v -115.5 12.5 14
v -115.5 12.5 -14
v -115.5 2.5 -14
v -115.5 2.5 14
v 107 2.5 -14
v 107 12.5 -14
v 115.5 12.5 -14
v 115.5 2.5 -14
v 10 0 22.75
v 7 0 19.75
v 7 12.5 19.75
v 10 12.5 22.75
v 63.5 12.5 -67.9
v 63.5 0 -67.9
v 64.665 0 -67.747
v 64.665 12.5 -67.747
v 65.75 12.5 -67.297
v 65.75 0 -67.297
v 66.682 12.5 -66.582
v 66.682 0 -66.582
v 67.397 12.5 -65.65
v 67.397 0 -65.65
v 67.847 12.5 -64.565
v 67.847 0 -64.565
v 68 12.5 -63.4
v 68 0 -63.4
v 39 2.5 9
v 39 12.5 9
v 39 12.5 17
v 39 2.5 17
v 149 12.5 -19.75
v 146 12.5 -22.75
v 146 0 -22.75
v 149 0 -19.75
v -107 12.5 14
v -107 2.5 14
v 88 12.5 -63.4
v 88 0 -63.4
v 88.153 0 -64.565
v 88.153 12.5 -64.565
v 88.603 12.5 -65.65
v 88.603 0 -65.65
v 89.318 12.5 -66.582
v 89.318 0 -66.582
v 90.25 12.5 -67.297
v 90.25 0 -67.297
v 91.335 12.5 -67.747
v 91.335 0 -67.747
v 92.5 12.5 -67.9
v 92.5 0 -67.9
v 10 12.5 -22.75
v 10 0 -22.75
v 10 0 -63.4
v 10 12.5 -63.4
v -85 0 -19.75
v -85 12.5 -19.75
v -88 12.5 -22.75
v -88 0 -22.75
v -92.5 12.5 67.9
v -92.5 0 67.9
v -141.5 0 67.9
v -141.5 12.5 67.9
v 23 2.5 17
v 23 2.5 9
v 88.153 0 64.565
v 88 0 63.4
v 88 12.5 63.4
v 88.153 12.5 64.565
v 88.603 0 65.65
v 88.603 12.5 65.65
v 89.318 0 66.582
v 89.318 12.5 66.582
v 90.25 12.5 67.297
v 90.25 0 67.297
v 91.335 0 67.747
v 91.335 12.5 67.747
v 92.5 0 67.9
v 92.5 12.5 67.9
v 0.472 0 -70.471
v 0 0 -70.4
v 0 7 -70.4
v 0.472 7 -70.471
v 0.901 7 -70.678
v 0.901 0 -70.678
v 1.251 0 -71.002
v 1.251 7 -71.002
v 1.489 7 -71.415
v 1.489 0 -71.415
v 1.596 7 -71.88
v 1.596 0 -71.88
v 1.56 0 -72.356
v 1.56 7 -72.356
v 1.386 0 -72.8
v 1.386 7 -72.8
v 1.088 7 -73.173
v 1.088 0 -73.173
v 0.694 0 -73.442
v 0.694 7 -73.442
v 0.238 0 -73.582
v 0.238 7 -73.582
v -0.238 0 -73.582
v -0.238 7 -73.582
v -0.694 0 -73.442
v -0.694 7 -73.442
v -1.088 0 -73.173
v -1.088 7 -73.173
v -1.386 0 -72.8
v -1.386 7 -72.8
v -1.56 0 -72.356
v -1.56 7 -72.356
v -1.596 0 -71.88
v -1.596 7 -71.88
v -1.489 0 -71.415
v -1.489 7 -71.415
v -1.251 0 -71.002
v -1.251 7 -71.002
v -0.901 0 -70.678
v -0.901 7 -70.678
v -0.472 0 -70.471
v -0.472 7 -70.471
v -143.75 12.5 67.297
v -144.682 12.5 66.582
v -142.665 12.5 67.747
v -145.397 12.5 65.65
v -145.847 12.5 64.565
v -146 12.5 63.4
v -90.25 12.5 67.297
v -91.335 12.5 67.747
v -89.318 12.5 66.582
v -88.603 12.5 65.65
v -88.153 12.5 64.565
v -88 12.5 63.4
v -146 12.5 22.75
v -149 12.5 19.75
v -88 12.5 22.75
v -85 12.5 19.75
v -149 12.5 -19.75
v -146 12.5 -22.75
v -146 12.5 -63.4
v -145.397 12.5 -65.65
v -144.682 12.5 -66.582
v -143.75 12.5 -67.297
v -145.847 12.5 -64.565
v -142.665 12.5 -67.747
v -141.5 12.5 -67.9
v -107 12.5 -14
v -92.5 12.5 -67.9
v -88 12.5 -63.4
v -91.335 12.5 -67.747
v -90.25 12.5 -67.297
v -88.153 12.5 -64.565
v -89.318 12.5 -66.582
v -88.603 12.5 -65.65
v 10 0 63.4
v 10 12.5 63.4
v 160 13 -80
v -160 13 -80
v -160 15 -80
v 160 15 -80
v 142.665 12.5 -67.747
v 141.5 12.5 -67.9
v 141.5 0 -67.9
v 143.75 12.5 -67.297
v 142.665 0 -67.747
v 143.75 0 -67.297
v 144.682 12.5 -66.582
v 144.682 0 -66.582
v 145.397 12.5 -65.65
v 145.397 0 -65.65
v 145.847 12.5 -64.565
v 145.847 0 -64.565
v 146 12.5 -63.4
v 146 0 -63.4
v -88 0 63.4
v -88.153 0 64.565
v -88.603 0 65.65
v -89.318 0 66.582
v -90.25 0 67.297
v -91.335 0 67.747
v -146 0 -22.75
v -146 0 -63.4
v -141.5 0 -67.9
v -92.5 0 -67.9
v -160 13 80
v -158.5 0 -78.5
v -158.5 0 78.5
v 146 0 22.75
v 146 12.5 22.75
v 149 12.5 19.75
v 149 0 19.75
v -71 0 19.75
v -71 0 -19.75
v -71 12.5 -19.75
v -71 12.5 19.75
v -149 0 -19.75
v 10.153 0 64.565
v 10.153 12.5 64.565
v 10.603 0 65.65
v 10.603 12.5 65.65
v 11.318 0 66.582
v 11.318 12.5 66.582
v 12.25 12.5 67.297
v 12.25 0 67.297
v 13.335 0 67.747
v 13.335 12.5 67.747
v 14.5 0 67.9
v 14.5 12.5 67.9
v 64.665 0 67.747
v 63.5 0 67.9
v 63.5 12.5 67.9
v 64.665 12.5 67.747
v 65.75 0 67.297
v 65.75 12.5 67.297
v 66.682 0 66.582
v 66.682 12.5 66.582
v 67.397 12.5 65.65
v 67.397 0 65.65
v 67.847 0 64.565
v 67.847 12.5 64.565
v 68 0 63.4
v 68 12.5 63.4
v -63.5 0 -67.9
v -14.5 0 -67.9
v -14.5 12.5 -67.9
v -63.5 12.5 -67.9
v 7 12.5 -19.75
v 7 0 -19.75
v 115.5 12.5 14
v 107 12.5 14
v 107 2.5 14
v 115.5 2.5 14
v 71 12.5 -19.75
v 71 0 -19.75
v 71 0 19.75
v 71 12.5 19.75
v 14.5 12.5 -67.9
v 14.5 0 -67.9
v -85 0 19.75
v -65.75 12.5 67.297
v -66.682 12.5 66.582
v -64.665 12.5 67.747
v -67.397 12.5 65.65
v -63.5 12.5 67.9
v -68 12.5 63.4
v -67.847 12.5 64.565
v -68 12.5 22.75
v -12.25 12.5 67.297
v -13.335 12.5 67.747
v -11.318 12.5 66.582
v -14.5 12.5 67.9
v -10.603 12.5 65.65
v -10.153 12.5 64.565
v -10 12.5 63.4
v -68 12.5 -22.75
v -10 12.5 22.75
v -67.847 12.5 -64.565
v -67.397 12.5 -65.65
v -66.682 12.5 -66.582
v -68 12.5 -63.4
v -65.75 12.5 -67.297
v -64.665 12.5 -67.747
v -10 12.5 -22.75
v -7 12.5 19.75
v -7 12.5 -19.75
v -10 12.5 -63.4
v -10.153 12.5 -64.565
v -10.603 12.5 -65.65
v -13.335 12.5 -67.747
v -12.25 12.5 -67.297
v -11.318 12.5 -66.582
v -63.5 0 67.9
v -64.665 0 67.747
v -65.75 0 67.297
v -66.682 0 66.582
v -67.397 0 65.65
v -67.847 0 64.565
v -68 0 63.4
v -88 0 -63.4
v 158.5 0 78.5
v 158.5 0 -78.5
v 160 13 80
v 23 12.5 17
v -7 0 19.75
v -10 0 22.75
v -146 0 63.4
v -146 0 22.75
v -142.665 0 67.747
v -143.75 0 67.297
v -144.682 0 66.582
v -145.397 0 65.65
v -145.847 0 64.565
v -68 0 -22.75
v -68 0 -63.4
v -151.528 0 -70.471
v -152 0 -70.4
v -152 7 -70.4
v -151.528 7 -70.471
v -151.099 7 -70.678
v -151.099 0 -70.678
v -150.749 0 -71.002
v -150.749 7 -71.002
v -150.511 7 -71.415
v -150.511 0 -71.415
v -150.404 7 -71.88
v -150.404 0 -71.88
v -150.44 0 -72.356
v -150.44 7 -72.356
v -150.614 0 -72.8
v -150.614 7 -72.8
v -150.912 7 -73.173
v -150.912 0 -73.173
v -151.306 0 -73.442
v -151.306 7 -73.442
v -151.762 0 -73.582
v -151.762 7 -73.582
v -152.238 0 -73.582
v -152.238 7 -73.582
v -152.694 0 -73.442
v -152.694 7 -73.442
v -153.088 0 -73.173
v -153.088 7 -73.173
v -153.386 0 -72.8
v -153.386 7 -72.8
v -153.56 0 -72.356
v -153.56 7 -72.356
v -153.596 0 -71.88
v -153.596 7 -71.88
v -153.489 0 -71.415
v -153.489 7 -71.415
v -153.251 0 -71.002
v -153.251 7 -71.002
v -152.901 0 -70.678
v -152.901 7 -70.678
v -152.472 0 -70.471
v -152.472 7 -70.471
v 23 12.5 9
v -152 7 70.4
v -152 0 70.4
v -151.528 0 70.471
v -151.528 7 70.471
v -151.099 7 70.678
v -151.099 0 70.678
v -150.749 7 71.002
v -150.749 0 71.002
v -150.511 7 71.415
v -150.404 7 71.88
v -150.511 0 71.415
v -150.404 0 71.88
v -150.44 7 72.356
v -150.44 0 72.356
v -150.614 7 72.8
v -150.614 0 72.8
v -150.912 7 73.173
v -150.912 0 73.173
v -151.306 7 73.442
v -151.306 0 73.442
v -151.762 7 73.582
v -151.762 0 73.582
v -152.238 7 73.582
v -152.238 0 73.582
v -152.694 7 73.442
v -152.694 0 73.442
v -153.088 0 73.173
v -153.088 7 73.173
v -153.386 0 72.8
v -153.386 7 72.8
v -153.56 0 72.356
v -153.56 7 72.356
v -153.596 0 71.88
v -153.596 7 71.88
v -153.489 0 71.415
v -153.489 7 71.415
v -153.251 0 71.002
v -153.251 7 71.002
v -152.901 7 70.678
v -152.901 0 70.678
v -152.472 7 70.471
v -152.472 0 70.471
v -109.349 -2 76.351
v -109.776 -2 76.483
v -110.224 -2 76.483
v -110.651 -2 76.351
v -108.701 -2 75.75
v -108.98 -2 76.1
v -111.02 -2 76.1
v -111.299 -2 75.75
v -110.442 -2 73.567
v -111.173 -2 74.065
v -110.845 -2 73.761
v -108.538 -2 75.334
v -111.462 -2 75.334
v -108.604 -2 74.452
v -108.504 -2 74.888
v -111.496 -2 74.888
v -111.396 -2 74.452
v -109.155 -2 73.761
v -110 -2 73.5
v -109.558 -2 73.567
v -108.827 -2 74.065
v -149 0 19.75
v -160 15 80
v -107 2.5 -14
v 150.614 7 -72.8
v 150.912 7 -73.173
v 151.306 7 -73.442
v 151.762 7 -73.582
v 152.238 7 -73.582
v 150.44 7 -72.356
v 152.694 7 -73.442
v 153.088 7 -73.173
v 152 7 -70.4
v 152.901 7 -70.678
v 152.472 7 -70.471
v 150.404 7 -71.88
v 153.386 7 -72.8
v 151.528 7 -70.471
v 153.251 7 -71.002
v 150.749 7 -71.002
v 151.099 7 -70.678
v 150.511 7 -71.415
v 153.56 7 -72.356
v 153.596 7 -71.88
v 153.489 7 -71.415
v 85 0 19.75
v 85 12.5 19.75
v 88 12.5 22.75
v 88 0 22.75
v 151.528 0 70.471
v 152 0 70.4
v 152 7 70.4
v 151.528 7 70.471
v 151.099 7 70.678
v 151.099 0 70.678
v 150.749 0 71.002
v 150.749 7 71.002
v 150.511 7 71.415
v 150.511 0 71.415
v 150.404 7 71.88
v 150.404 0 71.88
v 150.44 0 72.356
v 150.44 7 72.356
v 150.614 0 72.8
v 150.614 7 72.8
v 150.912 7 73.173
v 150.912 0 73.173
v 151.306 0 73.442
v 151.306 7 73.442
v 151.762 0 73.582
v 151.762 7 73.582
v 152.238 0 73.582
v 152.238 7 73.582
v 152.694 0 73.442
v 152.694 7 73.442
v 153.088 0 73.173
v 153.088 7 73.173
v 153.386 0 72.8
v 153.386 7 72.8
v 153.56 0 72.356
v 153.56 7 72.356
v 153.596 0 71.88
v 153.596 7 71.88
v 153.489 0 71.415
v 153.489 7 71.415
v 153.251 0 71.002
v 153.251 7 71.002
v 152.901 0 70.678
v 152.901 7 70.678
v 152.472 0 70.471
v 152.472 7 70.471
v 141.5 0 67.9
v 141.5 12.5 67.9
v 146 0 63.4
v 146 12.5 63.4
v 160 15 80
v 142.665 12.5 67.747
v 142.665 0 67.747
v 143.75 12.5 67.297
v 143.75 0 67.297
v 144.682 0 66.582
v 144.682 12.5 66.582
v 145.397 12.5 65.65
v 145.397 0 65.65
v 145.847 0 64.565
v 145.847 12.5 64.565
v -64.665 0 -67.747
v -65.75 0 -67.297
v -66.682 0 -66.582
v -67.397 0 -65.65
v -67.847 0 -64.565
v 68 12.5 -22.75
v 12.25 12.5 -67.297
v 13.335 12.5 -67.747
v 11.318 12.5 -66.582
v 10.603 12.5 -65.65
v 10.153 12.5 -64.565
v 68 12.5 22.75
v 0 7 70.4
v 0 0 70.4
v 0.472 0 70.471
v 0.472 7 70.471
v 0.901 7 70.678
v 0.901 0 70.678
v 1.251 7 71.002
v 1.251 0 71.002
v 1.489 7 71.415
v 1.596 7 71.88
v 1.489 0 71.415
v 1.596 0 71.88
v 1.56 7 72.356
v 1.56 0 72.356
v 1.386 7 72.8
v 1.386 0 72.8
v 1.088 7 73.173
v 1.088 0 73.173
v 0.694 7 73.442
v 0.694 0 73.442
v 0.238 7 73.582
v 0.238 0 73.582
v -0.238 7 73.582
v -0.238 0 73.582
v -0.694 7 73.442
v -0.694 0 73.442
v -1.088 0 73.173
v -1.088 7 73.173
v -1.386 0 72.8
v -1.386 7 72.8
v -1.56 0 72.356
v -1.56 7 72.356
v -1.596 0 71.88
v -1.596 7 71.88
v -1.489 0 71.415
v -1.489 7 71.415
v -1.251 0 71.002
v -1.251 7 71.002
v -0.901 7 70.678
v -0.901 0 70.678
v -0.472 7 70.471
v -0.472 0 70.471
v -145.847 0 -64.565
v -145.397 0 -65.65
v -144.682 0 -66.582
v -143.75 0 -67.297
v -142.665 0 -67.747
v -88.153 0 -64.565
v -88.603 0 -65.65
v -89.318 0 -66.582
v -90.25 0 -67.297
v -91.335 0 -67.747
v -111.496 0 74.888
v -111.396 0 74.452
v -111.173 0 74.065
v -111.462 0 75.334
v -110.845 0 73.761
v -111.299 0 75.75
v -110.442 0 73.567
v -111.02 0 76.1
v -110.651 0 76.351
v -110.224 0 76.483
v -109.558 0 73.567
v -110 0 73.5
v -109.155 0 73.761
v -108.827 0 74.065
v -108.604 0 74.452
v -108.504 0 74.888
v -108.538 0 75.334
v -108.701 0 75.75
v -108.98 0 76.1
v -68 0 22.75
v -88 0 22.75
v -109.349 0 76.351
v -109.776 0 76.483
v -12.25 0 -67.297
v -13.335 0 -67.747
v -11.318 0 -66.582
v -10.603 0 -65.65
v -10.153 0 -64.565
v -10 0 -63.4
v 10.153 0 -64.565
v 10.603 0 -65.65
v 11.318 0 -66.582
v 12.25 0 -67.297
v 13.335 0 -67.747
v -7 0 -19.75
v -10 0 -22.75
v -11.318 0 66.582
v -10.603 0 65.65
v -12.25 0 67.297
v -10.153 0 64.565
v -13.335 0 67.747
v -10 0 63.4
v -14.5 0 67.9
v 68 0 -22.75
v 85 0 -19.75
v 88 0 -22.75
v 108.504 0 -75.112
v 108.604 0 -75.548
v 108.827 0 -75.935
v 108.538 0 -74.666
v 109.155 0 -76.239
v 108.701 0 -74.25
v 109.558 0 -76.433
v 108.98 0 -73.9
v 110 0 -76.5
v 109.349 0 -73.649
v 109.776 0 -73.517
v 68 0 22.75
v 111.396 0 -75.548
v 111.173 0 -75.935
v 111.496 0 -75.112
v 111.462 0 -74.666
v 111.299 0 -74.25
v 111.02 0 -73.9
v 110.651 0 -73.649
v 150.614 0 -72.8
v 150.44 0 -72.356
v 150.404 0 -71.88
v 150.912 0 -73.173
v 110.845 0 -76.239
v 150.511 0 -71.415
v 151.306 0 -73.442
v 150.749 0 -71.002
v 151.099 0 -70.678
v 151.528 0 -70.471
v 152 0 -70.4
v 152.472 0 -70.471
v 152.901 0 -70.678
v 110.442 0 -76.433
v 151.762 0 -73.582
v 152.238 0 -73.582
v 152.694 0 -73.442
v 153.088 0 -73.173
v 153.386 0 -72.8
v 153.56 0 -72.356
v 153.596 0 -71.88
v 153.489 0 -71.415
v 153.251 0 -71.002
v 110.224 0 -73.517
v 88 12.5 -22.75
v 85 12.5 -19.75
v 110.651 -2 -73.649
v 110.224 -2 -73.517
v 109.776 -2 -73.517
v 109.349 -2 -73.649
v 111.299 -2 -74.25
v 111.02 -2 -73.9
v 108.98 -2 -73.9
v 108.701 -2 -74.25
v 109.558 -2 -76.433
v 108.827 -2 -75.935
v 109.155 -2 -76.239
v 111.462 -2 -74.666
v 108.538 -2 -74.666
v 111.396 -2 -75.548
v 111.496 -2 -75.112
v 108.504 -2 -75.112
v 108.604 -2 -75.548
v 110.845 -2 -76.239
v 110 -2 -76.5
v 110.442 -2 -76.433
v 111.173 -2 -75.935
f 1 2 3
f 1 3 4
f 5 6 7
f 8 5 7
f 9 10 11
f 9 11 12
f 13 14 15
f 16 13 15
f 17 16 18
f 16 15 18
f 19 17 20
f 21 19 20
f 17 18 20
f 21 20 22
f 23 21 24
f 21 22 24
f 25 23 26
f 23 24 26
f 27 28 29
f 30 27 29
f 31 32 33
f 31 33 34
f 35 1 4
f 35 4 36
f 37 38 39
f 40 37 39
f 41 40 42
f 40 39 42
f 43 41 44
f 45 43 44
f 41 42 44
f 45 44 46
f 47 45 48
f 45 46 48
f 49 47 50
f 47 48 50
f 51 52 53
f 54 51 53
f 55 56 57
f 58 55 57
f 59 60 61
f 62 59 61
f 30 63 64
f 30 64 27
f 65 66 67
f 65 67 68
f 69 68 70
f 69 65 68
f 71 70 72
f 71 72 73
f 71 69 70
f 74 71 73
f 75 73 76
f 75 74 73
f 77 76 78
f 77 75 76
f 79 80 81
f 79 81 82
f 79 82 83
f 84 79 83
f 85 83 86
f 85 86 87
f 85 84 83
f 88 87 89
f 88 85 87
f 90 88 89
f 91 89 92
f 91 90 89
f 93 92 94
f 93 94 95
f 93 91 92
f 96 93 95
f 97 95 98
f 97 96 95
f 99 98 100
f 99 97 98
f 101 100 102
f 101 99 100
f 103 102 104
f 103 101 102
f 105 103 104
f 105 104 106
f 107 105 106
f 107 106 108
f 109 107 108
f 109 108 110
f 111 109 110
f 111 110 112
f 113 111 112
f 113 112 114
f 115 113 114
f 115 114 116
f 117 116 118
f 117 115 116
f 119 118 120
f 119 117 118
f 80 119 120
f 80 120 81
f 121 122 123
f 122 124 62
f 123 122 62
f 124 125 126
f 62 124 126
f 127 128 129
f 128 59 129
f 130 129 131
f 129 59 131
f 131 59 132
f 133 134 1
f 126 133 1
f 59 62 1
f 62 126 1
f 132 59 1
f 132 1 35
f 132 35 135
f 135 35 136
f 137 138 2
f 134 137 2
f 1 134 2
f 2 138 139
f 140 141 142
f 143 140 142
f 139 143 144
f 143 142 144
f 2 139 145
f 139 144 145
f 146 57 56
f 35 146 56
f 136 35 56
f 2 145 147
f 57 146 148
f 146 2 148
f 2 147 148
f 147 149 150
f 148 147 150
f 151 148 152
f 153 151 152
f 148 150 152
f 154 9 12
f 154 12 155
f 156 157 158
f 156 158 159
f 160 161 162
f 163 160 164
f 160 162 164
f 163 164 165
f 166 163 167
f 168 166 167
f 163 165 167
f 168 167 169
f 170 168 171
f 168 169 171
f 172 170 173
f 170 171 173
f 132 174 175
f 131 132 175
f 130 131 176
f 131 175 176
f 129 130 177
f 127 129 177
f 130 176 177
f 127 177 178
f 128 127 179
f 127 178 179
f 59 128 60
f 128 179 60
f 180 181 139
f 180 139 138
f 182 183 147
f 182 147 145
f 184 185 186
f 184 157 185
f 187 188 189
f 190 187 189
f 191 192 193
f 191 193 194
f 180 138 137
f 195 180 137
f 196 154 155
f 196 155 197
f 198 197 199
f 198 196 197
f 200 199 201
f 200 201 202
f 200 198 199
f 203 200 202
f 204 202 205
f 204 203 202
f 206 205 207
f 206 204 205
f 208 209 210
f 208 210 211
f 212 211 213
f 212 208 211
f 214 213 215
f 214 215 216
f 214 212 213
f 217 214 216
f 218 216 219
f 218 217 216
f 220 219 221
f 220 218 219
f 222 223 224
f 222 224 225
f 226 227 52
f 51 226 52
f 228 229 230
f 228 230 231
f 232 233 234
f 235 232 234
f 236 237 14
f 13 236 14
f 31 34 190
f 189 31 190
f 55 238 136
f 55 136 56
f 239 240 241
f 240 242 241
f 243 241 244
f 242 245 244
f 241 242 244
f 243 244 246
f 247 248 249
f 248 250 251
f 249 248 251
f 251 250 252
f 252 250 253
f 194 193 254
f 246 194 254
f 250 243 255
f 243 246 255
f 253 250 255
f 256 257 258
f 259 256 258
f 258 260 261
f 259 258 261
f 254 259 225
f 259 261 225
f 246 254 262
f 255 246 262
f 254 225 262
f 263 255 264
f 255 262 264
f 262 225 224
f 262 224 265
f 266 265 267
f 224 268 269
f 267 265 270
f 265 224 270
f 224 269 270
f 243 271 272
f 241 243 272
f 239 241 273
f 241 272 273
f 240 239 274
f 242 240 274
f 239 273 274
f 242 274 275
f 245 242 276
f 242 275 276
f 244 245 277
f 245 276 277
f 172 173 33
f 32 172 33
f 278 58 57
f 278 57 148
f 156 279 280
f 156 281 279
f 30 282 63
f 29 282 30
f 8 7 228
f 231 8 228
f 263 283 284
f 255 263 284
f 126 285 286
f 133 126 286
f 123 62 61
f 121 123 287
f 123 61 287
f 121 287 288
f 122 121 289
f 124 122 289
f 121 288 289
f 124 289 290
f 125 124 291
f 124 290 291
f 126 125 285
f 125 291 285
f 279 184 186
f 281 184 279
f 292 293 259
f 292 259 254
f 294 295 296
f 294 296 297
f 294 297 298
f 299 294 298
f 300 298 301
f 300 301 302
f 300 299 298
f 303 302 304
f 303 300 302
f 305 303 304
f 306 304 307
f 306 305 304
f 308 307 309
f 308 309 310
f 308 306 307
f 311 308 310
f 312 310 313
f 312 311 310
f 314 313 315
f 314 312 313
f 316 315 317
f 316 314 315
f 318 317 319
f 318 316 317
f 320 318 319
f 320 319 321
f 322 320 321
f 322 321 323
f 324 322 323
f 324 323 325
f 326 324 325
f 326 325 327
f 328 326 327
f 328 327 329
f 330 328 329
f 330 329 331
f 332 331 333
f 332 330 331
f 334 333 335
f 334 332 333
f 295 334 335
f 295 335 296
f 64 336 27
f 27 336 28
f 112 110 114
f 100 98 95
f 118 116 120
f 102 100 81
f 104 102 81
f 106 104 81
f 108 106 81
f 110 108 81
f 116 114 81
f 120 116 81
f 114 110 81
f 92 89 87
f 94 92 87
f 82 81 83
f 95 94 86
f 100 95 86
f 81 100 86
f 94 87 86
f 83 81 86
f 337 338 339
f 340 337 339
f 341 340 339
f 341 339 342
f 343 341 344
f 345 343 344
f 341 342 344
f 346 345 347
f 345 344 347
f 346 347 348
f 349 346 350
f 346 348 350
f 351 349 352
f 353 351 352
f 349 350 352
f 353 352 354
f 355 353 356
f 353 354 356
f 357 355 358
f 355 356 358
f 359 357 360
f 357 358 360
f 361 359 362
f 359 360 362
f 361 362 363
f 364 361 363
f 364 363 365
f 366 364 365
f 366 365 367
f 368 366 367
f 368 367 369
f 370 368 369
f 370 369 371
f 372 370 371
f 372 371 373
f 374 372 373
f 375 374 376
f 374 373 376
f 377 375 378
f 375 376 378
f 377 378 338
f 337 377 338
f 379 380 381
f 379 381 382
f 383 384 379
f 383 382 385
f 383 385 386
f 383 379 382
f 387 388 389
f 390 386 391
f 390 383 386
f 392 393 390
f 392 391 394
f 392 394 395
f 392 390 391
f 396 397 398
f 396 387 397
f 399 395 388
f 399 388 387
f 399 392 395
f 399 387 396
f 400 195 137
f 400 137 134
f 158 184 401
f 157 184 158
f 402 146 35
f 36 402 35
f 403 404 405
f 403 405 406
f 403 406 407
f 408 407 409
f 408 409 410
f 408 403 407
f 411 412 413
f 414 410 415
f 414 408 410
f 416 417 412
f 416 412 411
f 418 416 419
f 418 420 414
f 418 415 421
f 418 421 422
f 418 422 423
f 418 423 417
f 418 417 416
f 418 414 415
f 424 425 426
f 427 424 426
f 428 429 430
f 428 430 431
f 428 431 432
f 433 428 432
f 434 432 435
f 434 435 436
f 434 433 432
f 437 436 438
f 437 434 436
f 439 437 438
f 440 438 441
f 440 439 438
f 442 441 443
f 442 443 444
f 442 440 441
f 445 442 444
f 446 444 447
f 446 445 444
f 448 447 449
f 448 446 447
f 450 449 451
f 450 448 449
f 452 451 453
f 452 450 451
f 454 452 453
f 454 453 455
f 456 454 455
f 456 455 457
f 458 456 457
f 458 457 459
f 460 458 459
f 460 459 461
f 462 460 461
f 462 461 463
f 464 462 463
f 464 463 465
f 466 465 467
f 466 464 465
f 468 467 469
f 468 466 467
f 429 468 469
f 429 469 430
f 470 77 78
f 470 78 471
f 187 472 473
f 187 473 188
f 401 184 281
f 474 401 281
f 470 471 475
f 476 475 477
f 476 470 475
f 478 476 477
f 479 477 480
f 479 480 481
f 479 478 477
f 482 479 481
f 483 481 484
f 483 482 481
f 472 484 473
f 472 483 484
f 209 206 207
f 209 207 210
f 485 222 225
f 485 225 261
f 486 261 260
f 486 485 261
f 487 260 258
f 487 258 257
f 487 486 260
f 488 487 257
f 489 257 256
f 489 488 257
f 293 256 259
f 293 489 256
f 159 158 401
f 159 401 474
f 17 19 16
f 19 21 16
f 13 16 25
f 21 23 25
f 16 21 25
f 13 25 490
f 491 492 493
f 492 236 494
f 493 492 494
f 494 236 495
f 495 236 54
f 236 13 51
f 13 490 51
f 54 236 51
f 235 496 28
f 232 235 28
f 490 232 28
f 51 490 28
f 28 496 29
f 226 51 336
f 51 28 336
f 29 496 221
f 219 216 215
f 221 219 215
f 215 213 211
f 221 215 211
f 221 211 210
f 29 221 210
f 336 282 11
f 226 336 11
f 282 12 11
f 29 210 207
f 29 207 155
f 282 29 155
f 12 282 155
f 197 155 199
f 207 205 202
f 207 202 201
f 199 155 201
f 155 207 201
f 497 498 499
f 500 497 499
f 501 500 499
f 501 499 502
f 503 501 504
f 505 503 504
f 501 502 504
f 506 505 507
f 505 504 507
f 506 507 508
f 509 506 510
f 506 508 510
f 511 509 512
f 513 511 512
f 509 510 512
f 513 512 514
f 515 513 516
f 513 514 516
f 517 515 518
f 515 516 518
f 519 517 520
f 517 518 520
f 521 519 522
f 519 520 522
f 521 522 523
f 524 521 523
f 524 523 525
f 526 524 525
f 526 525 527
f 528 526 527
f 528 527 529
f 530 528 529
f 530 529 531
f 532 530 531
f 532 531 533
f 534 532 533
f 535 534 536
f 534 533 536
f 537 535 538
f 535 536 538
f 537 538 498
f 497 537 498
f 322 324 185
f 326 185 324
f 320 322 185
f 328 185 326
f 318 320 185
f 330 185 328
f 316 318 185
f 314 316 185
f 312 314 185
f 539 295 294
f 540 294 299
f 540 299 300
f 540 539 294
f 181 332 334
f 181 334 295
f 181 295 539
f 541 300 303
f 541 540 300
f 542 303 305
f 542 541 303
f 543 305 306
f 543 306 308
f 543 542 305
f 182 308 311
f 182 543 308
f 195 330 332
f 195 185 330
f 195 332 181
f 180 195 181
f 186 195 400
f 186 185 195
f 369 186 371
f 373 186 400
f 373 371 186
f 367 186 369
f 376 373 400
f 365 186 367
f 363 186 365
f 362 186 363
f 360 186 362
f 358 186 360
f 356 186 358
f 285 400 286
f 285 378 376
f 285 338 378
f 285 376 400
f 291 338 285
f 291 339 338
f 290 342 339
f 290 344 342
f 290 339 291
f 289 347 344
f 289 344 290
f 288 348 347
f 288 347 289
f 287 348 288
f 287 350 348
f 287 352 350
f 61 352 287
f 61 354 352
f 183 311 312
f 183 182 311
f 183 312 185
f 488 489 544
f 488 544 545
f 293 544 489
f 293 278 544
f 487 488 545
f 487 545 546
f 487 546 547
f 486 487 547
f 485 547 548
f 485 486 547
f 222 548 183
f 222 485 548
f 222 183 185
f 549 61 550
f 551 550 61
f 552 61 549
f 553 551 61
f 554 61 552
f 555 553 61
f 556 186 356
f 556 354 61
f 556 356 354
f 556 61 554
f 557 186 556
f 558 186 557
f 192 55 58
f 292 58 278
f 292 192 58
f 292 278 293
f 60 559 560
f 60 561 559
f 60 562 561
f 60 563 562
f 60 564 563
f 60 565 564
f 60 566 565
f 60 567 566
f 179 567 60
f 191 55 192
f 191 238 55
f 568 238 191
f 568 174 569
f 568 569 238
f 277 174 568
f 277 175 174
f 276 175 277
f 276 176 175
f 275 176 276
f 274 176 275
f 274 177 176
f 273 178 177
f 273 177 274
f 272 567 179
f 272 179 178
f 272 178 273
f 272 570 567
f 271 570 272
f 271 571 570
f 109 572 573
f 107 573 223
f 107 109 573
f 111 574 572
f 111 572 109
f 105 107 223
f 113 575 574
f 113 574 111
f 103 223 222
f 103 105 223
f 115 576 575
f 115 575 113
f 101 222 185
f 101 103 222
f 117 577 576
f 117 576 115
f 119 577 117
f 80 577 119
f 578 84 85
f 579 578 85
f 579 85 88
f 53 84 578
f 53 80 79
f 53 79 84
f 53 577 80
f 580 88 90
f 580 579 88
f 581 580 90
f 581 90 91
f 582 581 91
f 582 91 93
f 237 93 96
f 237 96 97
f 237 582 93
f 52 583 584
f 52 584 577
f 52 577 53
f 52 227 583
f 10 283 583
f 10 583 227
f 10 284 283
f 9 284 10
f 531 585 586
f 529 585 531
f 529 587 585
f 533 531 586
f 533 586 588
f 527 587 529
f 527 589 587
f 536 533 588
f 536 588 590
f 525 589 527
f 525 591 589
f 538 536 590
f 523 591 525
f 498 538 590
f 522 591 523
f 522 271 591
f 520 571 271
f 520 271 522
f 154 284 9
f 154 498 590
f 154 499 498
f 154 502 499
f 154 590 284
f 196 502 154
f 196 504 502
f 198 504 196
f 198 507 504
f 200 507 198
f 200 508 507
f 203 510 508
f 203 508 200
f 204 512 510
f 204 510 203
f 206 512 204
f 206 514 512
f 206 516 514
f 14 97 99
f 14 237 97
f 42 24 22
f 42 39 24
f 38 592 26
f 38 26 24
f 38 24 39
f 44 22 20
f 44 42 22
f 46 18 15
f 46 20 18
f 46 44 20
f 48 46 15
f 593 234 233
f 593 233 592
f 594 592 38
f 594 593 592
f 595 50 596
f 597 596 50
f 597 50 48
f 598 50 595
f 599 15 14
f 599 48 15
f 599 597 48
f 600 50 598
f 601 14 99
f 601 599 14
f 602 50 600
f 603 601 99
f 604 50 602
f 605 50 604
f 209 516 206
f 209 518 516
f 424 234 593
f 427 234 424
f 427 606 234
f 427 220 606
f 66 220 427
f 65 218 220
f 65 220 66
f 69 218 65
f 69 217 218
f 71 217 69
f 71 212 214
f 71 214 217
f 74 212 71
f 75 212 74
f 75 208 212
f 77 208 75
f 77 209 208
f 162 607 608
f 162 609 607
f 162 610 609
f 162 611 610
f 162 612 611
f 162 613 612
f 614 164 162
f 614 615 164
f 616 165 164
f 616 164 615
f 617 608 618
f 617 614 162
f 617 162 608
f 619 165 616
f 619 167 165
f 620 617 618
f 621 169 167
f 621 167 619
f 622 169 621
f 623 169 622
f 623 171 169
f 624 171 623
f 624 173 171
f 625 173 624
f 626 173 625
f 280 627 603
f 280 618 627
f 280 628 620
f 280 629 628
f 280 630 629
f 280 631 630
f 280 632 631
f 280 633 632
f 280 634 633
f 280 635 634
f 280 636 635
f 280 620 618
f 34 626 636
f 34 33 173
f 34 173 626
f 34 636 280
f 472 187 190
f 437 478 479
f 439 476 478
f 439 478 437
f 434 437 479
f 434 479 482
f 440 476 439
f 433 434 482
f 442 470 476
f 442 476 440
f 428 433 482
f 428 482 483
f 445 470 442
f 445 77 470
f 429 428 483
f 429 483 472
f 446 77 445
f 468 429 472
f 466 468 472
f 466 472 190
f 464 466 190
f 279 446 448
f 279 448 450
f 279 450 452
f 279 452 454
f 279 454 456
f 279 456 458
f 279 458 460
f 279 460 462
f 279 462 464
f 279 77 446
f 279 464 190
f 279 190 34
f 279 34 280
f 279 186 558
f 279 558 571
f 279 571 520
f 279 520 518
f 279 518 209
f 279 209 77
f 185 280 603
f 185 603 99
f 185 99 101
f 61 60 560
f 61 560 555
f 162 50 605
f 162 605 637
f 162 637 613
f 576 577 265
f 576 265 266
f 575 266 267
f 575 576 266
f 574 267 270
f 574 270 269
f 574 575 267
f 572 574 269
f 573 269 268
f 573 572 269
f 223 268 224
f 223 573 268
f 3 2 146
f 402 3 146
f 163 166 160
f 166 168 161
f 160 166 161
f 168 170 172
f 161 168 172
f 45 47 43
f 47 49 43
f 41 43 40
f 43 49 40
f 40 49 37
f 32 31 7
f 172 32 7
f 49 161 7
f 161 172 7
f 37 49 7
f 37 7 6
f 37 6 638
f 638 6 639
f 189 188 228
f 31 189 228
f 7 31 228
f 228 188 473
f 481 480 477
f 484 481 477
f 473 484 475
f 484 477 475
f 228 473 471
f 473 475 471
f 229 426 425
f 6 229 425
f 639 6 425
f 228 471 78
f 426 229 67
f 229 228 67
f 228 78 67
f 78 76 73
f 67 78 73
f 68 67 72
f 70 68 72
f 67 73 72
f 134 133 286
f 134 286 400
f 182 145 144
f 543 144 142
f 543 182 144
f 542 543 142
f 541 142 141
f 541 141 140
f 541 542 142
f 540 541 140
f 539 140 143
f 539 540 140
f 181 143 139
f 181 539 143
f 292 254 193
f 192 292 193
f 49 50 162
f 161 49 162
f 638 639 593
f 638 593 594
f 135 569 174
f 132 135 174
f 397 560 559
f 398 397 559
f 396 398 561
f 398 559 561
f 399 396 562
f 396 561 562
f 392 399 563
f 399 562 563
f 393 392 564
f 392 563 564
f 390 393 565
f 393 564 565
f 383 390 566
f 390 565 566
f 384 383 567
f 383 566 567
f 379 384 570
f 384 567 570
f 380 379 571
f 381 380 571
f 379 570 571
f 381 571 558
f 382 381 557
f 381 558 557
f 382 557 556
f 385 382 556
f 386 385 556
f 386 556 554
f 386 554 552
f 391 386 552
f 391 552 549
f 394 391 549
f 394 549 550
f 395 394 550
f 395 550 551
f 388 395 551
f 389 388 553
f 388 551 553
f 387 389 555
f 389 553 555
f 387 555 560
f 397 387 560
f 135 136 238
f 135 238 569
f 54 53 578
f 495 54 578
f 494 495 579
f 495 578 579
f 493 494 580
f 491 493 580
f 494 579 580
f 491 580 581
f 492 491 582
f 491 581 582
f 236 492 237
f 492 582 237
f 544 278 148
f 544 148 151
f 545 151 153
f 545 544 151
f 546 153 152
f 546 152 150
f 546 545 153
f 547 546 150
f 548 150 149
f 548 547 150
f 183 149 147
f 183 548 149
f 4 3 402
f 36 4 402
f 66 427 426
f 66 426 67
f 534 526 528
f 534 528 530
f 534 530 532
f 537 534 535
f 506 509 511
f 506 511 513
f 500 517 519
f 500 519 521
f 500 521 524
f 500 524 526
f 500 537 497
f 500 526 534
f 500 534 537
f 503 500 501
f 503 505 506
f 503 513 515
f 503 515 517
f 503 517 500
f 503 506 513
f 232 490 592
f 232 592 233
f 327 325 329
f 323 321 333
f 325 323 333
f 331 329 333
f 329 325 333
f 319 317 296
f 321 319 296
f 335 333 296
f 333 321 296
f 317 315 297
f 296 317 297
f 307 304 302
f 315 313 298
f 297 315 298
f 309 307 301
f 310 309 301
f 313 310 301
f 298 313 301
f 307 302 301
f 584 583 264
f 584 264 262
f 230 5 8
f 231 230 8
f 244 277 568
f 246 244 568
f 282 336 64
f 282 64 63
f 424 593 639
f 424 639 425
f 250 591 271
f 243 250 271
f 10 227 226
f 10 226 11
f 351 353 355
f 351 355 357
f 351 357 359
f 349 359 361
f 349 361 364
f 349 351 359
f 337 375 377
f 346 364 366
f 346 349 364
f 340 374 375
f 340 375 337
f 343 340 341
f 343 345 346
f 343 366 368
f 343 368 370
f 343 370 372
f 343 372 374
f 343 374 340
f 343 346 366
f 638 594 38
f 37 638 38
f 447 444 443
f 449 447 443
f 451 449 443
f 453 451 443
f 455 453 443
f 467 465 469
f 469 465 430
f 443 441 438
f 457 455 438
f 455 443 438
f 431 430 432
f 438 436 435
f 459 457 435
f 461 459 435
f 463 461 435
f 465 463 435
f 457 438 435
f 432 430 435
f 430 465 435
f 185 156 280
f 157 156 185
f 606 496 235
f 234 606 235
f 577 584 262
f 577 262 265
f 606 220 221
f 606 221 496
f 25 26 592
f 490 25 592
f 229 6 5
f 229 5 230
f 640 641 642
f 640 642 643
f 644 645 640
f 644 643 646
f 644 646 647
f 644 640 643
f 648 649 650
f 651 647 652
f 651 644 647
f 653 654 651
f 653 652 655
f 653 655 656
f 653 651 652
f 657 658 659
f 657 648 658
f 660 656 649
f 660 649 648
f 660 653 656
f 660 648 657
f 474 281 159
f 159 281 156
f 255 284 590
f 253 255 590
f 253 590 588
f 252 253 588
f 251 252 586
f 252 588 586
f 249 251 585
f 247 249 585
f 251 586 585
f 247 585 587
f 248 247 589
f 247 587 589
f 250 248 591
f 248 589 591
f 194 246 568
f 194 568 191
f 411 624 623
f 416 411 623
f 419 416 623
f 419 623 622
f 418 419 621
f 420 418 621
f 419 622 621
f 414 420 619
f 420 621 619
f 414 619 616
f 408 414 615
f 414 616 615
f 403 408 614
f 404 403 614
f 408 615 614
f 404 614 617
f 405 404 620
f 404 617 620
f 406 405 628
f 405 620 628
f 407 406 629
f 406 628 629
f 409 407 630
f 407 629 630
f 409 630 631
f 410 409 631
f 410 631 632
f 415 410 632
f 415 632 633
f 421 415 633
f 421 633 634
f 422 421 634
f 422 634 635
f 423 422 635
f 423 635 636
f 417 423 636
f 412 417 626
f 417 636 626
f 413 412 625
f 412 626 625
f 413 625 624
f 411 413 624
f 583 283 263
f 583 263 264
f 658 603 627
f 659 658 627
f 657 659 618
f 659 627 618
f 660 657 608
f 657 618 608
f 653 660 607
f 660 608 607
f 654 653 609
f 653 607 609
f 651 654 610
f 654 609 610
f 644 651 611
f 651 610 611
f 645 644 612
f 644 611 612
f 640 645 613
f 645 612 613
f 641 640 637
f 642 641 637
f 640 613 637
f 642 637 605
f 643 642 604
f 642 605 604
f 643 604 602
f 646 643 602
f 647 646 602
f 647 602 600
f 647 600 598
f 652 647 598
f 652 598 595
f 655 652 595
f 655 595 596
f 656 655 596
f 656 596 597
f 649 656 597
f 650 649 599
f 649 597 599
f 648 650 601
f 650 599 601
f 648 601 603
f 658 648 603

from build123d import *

# Parameters (mm, degrees)
SKETCH2_W                                  = 320
SKETCH2_H                                  = 160
BOSS_EXTRUDE1_DEPTH                        = 2
SKETCH3_R                                  = 1.6
CUT_EXTRUDE1_DEPTH                         = 7
CUT_EXTRUDE2_DEPTH                         = 12.5
MIRROR1_AT_THE_SECOND_PLANE_COPY_1_SKETC_R = 1.6
MIRROR1_AT_THE_SECOND_PLANE_COPY_1_DEPTH   = 7
MIRROR1_AT_THE_SECOND_PLANE_COPY_2_DEPTH   = 12.5
SKETCH4_W                                  = 8.5
SKETCH4_H                                  = 28
SKETCH4_W_2                                = 16
SKETCH4_H_2                                = 8
BOSS_EXTRUDE3_DEPTH                        = 10
SKETCH5_R                                  = 1.5
BOSS_EXTRUDE4_DEPTH                        = 2


with BuildPart() as part:
    # Sketch2 → Boss-Extrude1 (new body)
    with BuildSketch(Plane(origin=(0, 13, 0), x_dir=(1, 0, 0), z_dir=(0, 1, 0))):
        Rectangle(SKETCH2_W, SKETCH2_H)
    extrude(amount=BOSS_EXTRUDE1_DEPTH)

    # Sketch1 → Loft1 section 0
    with BuildSketch(Plane(origin=(0, 0, 0), x_dir=(1, 0, 0), z_dir=(0, 1, 0))):
        with BuildLine():
            Line((-158.5, -78.5), (158.5, -78.5))
            Line((158.5, -78.5), (158.5, 78.5))
            Line((158.5, 78.5), (-158.5, 78.5))
            Line((-158.5, 78.5), (-158.5, -78.5))
        make_face()
    # Sketch2<2> → Loft1 section 1
    with BuildSketch(Plane(origin=(0, 13, 0), x_dir=(1, 0, 0), z_dir=(0, 1, 0))):
        with BuildLine():
            Line((160, -80), (-160, -80))
            Line((-160, -80), (-160, 80))
            Line((-160, 80), (160, 80))
            Line((160, 80), (160, -80))
        make_face()
    loft()

    # Sketch3 → Cut-Extrude1 (cut)
    with BuildSketch(Plane.XZ):
        with Locations((0, 72)):
            Circle(SKETCH3_R)
        with Locations((-152, 72)):
            Circle(SKETCH3_R)
    cut_extrude1 = extrude(amount=-CUT_EXTRUDE1_DEPTH, mode=Mode.SUBTRACT)

    # Sketch3<4> → Cut-Extrude2 (cut)
    with BuildSketch(Plane.XZ):
        with BuildLine():
            Line((-85, 0), (-85, 19.75))
            Line((-85, 19.75), (-88, 22.75))
            Line((-88, 22.75), (-88, 63.4))
            ThreePointArc((-88, 63.4), (-89.318019485, 66.581980515), (-92.5, 67.9))
            Line((-92.5, 67.9), (-141.5, 67.9))
            ThreePointArc((-141.5, 67.9), (-144.681980515, 66.581980515), (-146, 63.4))
            Line((-146, 63.4), (-146, 22.75))
            Line((-146, 22.75), (-149, 19.75))
            Line((-149, 19.75), (-149, 0))
            Line((-149, 0), (-85, 0))
        make_face()
        with BuildLine():
            Line((-71, 0), (-7, 0))
            Line((-7, 0), (-7, 19.75))
            Line((-7, 19.75), (-10, 22.75))
            Line((-10, 22.75), (-10, 63.4))
            ThreePointArc((-10, 63.4), (-11.318019485, 66.581980515), (-14.5, 67.9))
            Line((-14.5, 67.9), (-63.5, 67.9))
            ThreePointArc((-63.5, 67.9), (-66.681980515, 66.581980515), (-68, 63.4))
            Line((-68, 63.4), (-68, 22.75))
            Line((-68, 22.75), (-71, 19.75))
            Line((-71, 19.75), (-71, 0))
        make_face()
    cut_extrude2 = extrude(amount=-CUT_EXTRUDE2_DEPTH, mode=Mode.SUBTRACT)

    # Mirror1: Cut-Extrude1, Cut-Extrude2 across plane
    add(cut_extrude1.mirror(Plane.XY), mode=Mode.SUBTRACT)
    add(cut_extrude2.mirror(Plane.XY), mode=Mode.SUBTRACT)

    # Mirror1 at the second plane: Cut-Extrude1, Cut-Extrude2 across plane
    add(cut_extrude1.mirror(Plane(origin=(0, 0, 0), x_dir=(0, 0, 1), z_dir=(1, 0, 0))), mode=Mode.SUBTRACT)
    add(cut_extrude2.mirror(Plane(origin=(0, 0, 0), x_dir=(0, 0, 1), z_dir=(1, 0, 0))), mode=Mode.SUBTRACT)

    # Mirror1 at the second plane copy 1 sketc → Mirror1 at the second plane copy 1 (cut)
    with BuildSketch(Plane(origin=(0, 0, 0), x_dir=(-1, 0, 0), z_dir=(0, -1, 0))):
        with Locations((0, 72)):
            Circle(MIRROR1_AT_THE_SECOND_PLANE_COPY_1_SKETC_R)
        with Locations((-152, 72)):
            Circle(MIRROR1_AT_THE_SECOND_PLANE_COPY_1_SKETC_R)
    extrude(amount=-MIRROR1_AT_THE_SECOND_PLANE_COPY_1_DEPTH, mode=Mode.SUBTRACT)

    # Mirror1 at the second plane copy 2 sketc → Mirror1 at the second plane copy 2 (cut)
    with BuildSketch(Plane(origin=(0, 0, 0), x_dir=(-1, 0, 0), z_dir=(0, -1, 0))):
        with BuildLine():
            Line((-85, 0), (-85, 19.75))
            Line((-85, 19.75), (-88, 22.75))
            Line((-88, 22.75), (-88, 63.4))
            ThreePointArc((-88, 63.4), (-89.318019485, 66.581980515), (-92.5, 67.9))
            Line((-92.5, 67.9), (-141.5, 67.9))
            ThreePointArc((-141.5, 67.9), (-144.681980515, 66.581980515), (-146, 63.4))
            Line((-146, 63.4), (-146, 22.75))
            Line((-146, 22.75), (-149, 19.75))
            Line((-149, 19.75), (-149, 0))
            Line((-149, 0), (-85, 0))
        make_face()
        with BuildLine():
            Line((-71, 0), (-7, 0))
            Line((-7, 0), (-7, 19.75))
            Line((-7, 19.75), (-10, 22.75))
            Line((-10, 22.75), (-10, 63.4))
            ThreePointArc((-10, 63.4), (-11.318019485, 66.581980515), (-14.5, 67.9))
            Line((-14.5, 67.9), (-63.5, 67.9))
            ThreePointArc((-63.5, 67.9), (-66.681980515, 66.581980515), (-68, 63.4))
            Line((-68, 63.4), (-68, 22.75))
            Line((-68, 22.75), (-71, 19.75))
            Line((-71, 19.75), (-71, 0))
        make_face()
    extrude(amount=-MIRROR1_AT_THE_SECOND_PLANE_COPY_2_DEPTH, mode=Mode.SUBTRACT)

    # Sketch4 → Boss-Extrude3 (add)
    with BuildSketch(Plane.XZ.offset(-12.5)):
        with Locations((-111.25, 0)):
            Rectangle(SKETCH4_W, SKETCH4_H)
        with Locations((111.25, 0)):
            Rectangle(SKETCH4_W, SKETCH4_H)
        with Locations((31, 13)):
            Rectangle(SKETCH4_W_2, SKETCH4_H_2)
    extrude(amount=BOSS_EXTRUDE3_DEPTH)

    # Sketch5 → Boss-Extrude4 (add)
    with BuildSketch(Plane.XZ):
        with Locations((-110, 75)):
            Circle(SKETCH5_R)
        with Locations((110, -75)):
            Circle(SKETCH5_R)
    extrude(amount=BOSS_EXTRUDE4_DEPTH)


solid = part.part
